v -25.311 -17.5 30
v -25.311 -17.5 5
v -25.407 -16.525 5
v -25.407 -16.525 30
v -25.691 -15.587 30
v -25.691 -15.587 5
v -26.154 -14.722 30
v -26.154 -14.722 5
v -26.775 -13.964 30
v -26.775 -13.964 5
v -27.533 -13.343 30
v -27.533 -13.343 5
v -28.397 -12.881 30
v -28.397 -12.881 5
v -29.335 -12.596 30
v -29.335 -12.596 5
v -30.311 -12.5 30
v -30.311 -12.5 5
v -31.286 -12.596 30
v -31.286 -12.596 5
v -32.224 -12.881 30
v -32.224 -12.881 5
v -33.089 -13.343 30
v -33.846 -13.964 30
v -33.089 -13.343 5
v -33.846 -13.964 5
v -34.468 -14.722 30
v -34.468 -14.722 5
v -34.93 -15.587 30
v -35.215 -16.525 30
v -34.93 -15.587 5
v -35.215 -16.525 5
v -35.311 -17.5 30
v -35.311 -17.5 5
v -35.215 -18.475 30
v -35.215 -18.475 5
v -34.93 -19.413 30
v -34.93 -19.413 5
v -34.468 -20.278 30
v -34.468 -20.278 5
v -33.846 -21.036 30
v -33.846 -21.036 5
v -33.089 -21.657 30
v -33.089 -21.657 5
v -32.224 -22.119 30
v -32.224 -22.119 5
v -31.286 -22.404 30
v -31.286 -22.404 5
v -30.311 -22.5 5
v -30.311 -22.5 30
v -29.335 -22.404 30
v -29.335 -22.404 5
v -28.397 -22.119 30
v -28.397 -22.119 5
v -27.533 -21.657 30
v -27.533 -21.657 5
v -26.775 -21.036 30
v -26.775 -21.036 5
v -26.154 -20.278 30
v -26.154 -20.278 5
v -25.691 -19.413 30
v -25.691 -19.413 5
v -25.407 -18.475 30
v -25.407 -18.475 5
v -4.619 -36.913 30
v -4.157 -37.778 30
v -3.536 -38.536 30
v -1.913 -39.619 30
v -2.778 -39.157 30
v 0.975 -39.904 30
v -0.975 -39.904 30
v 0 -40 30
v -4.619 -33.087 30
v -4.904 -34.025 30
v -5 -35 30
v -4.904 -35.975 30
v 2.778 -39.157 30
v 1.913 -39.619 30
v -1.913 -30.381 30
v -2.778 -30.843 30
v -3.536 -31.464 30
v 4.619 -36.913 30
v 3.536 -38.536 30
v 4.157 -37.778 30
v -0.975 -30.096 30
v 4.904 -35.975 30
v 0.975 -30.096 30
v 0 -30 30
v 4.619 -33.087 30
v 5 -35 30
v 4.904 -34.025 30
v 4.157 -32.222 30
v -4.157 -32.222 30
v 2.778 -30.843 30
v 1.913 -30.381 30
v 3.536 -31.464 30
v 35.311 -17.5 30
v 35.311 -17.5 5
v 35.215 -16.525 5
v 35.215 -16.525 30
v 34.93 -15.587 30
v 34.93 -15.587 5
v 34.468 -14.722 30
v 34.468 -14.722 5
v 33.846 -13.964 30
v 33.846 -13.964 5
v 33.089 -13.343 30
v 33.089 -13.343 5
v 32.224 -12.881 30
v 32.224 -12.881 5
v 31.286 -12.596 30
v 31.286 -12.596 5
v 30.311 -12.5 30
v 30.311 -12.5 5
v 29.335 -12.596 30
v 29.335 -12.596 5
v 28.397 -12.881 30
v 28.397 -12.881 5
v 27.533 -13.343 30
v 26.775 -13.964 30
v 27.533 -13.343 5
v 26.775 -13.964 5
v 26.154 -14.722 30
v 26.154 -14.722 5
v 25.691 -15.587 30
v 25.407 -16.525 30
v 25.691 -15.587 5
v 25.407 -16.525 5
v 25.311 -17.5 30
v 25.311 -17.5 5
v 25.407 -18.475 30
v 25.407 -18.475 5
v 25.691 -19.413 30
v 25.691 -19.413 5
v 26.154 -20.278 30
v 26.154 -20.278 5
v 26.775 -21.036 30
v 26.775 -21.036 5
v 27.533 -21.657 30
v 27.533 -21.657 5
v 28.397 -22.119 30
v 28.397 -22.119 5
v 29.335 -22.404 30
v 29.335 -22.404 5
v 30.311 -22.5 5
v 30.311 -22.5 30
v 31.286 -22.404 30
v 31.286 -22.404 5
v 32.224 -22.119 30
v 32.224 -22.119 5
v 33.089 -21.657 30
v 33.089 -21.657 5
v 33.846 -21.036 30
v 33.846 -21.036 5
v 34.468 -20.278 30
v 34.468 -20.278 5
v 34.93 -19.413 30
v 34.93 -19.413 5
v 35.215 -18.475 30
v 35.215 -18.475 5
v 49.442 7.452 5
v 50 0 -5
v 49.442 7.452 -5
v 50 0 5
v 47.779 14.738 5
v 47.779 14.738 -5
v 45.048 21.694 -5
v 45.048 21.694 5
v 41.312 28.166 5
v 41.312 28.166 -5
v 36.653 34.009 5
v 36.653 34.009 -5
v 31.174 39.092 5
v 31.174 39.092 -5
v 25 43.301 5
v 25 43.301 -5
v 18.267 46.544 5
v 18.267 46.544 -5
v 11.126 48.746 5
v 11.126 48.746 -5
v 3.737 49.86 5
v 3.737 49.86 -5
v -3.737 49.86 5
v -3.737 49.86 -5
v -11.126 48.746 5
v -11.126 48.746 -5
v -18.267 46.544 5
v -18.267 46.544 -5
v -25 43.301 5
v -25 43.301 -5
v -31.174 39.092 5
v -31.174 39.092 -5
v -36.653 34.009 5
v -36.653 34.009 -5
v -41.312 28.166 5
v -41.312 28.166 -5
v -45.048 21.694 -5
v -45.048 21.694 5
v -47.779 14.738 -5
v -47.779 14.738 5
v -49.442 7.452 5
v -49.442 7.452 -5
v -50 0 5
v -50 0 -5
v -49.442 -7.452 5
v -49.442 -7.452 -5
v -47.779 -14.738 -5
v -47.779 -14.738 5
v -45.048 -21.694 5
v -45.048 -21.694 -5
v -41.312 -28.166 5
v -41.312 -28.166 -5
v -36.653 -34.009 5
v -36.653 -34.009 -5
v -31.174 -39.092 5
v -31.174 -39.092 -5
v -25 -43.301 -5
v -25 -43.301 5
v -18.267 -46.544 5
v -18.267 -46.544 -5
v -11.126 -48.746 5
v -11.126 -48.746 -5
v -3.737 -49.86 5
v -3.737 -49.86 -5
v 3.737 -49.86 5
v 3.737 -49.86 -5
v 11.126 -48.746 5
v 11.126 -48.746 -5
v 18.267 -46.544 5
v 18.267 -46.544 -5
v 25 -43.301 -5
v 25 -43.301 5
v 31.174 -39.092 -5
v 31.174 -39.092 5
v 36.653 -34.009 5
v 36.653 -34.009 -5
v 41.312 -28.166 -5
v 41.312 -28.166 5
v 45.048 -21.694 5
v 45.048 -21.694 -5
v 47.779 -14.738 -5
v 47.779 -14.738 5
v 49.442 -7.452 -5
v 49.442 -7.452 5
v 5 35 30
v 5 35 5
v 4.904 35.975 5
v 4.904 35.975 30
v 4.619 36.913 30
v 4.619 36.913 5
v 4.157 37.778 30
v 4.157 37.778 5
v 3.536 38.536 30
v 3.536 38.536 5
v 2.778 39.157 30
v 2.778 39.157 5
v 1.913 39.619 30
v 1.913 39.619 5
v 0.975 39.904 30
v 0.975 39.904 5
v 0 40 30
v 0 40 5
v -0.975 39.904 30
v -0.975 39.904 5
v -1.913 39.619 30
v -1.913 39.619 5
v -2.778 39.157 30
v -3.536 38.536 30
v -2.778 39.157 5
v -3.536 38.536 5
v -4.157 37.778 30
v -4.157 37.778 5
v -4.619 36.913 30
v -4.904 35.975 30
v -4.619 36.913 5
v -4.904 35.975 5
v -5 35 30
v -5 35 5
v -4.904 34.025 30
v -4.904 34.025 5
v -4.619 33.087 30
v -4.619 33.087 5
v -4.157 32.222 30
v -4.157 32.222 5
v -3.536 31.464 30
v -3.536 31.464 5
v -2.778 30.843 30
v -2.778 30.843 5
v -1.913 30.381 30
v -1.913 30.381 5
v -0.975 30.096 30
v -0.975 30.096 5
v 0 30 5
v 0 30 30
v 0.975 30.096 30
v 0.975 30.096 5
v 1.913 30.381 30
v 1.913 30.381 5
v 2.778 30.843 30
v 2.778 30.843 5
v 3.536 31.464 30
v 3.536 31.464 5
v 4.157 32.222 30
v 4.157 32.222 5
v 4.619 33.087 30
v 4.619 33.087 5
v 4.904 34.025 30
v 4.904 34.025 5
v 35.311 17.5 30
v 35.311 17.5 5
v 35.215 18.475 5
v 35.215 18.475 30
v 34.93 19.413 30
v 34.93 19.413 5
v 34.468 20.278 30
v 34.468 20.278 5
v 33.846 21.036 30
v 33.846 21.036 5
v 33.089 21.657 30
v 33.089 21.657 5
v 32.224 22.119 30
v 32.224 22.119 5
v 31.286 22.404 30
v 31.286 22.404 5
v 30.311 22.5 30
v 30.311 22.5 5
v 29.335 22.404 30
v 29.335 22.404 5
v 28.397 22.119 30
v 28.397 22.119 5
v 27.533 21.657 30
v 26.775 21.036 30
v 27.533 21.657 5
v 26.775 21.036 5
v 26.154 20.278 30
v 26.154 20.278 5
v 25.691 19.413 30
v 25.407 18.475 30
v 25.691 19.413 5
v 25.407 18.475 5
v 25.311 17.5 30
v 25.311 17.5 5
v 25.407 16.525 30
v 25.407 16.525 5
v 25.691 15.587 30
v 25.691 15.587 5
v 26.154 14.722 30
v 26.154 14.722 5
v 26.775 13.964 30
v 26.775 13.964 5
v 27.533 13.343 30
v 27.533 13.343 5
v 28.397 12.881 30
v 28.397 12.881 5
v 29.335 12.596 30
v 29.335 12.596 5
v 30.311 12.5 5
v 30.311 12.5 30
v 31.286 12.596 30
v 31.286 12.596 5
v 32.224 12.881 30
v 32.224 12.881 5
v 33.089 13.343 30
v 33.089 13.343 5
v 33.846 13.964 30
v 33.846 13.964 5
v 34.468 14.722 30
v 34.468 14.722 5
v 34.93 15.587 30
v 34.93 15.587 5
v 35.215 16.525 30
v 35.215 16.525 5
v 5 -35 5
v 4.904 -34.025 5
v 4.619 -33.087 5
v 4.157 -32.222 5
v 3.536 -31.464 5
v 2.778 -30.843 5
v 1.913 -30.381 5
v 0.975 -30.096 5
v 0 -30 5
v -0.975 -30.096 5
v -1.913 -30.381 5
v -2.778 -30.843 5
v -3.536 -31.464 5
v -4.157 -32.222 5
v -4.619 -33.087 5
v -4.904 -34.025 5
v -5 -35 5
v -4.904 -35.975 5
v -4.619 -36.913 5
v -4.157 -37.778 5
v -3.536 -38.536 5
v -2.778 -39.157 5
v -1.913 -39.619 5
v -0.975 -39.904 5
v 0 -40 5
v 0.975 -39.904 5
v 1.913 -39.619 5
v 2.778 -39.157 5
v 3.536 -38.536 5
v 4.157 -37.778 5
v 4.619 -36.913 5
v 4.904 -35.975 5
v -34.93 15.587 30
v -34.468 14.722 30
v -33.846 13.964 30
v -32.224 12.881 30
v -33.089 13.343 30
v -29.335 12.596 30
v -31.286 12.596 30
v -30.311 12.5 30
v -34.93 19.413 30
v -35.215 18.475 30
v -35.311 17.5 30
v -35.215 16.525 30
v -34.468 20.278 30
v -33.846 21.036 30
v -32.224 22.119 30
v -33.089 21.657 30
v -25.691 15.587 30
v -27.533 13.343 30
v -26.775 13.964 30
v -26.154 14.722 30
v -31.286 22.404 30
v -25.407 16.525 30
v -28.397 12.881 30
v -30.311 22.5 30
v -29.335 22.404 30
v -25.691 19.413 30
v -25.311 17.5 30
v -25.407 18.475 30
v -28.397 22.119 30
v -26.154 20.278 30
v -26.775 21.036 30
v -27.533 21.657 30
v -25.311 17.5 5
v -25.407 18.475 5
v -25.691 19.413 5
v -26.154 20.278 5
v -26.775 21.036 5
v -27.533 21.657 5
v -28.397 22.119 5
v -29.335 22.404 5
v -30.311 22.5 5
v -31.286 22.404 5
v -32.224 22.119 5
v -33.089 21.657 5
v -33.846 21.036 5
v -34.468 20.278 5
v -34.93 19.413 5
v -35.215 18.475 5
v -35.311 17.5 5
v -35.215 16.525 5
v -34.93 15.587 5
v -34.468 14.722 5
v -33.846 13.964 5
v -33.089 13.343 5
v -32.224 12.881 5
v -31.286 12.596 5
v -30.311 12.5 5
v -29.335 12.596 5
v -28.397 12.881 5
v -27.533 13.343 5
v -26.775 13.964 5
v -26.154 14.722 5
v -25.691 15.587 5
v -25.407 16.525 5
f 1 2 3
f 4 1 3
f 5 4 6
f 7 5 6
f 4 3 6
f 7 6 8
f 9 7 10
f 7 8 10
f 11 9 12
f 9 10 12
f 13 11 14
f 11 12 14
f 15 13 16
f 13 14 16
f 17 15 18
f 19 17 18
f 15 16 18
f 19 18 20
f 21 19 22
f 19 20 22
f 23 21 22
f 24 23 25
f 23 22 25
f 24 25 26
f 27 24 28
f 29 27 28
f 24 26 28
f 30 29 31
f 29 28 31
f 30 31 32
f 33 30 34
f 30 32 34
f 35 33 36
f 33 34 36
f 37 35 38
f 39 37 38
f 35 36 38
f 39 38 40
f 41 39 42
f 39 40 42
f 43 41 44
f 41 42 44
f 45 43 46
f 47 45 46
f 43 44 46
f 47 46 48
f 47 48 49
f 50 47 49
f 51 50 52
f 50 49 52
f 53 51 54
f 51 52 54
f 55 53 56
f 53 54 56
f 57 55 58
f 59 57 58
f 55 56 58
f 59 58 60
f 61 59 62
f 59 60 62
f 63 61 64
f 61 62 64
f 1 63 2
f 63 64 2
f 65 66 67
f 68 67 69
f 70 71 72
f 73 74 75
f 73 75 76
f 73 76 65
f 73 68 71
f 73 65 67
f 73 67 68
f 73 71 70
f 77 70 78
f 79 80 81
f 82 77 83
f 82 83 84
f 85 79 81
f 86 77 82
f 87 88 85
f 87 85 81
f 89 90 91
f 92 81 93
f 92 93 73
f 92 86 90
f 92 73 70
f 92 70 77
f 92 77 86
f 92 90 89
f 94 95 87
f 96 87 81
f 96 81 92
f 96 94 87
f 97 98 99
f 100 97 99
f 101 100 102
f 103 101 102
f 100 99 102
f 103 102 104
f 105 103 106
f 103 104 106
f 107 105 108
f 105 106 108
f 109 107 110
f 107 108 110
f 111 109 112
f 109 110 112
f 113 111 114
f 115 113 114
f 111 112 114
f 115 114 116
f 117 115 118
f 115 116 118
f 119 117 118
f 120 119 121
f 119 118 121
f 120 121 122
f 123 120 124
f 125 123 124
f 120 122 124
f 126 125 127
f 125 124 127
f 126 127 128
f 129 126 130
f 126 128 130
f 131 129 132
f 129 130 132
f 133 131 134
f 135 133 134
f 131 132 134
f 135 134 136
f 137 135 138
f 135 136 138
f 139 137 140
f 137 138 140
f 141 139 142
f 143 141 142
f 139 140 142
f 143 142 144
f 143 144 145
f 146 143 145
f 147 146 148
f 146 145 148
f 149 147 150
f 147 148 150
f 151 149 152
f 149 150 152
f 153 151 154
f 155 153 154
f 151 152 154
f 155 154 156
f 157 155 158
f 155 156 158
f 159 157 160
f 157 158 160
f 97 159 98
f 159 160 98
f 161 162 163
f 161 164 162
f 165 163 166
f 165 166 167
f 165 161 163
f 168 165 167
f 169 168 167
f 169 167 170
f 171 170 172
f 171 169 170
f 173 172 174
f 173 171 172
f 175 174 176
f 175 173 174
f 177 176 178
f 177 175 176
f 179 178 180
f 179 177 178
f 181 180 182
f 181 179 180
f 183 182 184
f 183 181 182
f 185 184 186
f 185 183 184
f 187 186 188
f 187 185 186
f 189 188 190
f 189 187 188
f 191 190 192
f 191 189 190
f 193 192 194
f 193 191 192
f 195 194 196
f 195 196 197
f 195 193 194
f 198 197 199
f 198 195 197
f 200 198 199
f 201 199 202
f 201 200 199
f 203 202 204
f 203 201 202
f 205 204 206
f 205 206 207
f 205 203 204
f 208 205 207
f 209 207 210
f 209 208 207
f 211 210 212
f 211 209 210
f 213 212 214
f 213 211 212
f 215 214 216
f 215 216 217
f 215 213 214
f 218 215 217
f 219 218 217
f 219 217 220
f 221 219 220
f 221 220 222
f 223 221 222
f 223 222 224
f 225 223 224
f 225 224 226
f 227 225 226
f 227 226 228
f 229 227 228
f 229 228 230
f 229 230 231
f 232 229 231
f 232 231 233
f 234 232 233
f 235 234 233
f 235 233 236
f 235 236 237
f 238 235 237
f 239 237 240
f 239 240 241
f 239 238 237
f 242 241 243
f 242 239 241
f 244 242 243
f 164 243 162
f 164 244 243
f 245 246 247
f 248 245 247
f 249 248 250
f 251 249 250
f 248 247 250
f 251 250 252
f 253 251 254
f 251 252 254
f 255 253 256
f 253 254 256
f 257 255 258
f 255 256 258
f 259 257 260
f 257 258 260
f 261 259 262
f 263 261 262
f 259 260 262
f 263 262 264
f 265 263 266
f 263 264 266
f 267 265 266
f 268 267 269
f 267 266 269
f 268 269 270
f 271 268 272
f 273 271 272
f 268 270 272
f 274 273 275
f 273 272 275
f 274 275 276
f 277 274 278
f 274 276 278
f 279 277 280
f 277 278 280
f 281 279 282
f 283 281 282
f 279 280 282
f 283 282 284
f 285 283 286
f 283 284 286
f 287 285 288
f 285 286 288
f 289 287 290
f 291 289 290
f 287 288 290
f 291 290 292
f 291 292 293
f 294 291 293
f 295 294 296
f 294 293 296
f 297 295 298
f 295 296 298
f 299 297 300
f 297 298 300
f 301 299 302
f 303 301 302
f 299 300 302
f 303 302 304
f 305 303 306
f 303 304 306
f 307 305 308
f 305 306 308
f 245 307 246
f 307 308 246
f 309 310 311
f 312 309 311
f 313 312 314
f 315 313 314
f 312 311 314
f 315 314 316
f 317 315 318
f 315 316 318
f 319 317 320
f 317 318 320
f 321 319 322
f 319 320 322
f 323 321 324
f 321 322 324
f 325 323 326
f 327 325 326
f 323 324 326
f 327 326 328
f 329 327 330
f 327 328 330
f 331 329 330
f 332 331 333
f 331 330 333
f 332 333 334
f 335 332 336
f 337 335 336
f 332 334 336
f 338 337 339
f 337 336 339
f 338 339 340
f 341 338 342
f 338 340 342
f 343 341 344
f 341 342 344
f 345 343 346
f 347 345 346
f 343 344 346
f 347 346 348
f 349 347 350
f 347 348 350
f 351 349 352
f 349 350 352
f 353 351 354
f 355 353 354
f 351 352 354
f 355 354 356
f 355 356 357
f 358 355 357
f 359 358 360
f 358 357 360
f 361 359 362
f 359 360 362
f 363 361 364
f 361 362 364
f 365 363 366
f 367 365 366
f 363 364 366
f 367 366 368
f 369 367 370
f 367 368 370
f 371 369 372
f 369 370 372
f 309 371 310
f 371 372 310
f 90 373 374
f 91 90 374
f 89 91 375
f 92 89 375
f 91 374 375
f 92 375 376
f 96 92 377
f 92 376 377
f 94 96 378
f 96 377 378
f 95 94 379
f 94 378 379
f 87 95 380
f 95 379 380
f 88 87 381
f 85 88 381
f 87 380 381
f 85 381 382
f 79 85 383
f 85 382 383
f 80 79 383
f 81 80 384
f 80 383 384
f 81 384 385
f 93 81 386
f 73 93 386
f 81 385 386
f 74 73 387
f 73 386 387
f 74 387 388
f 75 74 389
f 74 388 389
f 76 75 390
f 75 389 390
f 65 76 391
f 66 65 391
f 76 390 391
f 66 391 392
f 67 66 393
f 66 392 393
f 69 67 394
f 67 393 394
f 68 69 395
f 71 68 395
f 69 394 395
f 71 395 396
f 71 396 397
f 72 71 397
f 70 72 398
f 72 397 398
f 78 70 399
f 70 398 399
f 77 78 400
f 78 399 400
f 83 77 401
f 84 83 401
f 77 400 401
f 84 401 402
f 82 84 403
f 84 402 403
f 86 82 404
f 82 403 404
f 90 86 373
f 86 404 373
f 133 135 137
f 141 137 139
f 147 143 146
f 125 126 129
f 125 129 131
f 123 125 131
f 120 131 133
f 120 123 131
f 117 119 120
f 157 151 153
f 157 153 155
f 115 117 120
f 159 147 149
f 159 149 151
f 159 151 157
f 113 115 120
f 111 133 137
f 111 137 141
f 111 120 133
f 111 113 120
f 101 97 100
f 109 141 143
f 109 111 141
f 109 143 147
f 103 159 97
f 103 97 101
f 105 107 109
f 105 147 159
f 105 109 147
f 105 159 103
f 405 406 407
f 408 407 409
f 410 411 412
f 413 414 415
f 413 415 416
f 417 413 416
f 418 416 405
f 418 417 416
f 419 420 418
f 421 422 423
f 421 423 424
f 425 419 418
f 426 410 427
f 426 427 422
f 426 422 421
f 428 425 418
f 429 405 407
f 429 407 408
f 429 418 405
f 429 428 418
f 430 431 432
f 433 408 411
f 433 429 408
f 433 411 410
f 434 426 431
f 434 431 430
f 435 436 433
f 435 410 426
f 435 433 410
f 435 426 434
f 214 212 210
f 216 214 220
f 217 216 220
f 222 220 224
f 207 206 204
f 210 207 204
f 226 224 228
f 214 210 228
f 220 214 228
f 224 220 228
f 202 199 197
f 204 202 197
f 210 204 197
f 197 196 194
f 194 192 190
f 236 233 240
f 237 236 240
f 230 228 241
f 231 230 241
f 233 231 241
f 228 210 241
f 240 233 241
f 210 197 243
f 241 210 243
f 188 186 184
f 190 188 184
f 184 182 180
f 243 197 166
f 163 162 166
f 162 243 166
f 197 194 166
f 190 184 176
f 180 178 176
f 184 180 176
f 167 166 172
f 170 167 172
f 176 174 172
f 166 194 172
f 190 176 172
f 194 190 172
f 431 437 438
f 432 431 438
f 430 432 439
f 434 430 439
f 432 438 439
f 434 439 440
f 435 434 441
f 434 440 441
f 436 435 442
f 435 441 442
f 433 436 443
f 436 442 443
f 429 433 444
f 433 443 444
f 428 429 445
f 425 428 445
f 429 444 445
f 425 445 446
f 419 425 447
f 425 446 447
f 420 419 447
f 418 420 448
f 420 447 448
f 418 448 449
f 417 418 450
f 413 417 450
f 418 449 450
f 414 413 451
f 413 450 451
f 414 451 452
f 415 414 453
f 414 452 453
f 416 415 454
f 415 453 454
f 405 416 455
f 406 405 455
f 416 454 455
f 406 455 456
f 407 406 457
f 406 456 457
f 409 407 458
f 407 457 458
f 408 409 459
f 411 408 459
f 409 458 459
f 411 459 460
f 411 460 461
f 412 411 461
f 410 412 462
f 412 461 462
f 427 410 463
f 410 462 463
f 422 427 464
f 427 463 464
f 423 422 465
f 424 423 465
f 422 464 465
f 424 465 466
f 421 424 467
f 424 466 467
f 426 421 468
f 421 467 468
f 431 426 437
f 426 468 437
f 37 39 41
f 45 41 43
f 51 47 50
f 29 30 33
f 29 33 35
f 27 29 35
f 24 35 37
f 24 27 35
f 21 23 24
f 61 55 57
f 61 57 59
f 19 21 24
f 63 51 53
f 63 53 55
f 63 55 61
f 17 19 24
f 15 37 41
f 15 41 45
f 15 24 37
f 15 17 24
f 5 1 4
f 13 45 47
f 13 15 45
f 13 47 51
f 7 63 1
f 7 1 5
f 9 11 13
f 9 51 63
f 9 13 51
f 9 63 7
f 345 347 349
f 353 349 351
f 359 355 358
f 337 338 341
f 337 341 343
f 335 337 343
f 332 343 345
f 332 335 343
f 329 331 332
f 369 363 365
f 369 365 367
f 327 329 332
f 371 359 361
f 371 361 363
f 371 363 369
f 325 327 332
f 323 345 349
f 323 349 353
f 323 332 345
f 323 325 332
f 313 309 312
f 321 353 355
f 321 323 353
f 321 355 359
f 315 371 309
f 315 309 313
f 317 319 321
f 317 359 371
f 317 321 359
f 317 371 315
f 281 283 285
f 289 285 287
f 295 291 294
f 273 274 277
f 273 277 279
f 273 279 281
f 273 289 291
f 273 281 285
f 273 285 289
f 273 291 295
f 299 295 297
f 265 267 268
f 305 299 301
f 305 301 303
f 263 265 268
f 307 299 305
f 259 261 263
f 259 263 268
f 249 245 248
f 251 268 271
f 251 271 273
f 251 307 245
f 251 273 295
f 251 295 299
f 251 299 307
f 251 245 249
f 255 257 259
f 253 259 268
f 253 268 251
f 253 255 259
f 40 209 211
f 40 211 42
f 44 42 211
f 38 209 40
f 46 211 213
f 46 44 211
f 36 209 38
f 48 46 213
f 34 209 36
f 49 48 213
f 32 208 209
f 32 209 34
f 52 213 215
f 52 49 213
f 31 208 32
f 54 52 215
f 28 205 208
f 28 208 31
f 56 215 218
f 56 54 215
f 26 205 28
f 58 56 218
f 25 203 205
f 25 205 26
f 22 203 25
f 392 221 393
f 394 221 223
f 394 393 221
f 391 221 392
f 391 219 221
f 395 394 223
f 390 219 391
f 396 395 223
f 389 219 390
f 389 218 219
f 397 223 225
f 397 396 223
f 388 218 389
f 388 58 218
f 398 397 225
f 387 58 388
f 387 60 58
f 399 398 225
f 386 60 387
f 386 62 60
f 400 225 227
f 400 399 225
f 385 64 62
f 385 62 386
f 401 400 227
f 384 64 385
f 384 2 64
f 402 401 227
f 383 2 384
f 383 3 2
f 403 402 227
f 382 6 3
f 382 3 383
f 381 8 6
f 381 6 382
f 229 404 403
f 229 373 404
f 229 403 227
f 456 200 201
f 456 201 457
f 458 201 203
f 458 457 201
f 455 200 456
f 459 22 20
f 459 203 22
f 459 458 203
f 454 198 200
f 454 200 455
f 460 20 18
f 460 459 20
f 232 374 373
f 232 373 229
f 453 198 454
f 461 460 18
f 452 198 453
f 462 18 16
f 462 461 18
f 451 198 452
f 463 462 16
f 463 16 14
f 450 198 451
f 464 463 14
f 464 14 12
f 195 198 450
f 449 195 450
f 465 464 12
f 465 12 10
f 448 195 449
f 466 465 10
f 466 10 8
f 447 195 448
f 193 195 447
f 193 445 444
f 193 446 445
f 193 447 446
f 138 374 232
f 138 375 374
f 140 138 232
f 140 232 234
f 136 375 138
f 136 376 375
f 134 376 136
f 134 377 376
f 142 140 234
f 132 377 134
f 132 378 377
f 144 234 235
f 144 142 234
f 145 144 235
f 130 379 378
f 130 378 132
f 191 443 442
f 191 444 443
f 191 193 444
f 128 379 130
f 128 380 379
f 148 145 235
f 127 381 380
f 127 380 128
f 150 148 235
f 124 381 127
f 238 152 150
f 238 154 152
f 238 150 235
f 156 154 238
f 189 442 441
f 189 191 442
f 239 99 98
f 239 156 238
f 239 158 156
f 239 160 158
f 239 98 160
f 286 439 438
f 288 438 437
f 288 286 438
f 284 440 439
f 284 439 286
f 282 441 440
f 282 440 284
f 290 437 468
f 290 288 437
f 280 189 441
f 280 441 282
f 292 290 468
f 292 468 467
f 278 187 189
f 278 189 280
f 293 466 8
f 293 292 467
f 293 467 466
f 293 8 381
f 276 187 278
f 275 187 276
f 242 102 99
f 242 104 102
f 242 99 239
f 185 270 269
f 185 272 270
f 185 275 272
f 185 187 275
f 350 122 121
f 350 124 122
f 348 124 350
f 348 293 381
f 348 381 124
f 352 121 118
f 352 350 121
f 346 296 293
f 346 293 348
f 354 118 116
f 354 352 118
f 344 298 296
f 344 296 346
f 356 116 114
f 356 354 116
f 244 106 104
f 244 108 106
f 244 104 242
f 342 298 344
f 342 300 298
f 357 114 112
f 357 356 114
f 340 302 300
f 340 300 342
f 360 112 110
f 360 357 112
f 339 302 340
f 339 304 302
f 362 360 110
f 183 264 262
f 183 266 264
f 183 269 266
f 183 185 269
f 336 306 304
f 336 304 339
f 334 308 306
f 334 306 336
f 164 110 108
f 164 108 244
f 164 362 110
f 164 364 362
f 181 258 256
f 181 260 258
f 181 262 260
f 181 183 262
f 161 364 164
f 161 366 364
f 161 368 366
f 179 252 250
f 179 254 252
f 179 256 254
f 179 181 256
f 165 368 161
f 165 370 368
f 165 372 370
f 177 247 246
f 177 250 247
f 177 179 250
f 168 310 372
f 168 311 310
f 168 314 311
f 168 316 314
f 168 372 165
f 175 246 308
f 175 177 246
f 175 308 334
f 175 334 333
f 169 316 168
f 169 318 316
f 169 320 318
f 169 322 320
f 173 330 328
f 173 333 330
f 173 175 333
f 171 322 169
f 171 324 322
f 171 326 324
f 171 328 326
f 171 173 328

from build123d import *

# Parameters (mm, degrees)
F0_R     = 50
F1_DEPTH = 5
F2_R     = 5
F3_DEPTH = 25


with BuildPart() as f1:
    # F0 (on Top) → F1 (new body, symmetric)
    with BuildSketch(Plane.XY):
        Circle(F0_R)
    extrude(amount=F1_DEPTH, both=True)

    # F2 (on face) → F3 (join)
    with BuildSketch(Plane.XY.offset(5)):
        with Locations((0, 35)):
            Circle(F2_R)
        with Locations((-30.310889, 17.5)):
            Circle(F2_R)
        with Locations((-30.310889, -17.5)):
            Circle(F2_R)
        with Locations((0, -35)):
            Circle(F2_R)
        with Locations((30.310889, -17.5)):
            Circle(F2_R)
        with Locations((30.310889, 17.5)):
            Circle(F2_R)
    extrude(amount=F3_DEPTH)


solid = f1.part
